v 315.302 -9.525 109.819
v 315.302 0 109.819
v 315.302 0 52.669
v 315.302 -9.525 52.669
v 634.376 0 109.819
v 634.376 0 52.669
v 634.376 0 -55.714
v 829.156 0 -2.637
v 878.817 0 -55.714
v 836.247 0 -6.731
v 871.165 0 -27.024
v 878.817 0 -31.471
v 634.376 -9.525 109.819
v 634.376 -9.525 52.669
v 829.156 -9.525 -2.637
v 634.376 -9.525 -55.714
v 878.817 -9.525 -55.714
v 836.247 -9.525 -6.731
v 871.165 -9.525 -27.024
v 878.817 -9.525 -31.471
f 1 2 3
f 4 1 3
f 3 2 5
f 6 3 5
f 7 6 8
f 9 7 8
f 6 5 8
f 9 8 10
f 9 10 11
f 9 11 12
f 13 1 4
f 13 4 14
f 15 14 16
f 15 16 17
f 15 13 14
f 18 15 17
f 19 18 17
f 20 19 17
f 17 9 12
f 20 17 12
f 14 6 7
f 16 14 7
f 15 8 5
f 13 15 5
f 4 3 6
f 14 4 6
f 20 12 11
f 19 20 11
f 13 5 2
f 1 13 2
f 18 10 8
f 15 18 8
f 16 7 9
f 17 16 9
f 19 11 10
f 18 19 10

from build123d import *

# Parameters (mm, degrees)
F0_W     = 304.8
F0_H     = 25.4
F1_DEPTH = 9.525


with BuildPart() as f1:
    # F0 (on Front) → F1 (new body)
    with BuildSketch(Plane.XZ):
        with Locations((474.0515406549, 97.119426218)):
            Rectangle(F0_W, F0_H)
        Polygon((315.3015375137, 52.669426218), (321.6515406549, 52.669426218), (321.6515406549, 84.419426218), (321.6515406549, 109.819426218), (315.3015375137, 109.819426218), align=None)
        Polygon((365.3527498245, 52.669426218), (626.4515406549, 52.669426218), (626.4515406549, 84.419426218), (321.6515406549, 84.419426218), (321.6515406549, 52.669426218), align=None)
        Polygon((626.4515406549, 84.419426218), (626.4515406549, 52.669426218), (634.3763406549, 66.3955824579), (634.3763406549, 109.819426218), (626.4515406549, 109.819426218), align=None)
        Polygon((634.3763406549, 109.819426218), (634.3763406549, 66.3955824579), (642.3265406549, 80.1657327882), (653.179416568, 98.963465278), align=None)
        Polygon((653.179416568, 98.963465278), (642.3265406549, 80.1657327882), (689.9515406549, 52.669426218), (733.3630443075, 52.669426218), align=None)
        Polygon((642.3265406549, 80.1657327882), (634.3763406549, 66.3955824579), (634.3763406549, 52.669426218), (689.9515406549, 52.669426218), align=None)
        Polygon((634.3763406549, 66.3955824579), (626.4515406549, 52.669426218), (634.3763406549, 52.669426218), align=None)
        Polygon((802.4279027039, -48.930573782), (634.3763406549, 48.0940408048), (634.3763406549, -55.7142719626), (807.9667468622, -55.7142719626), (836.2473392138, -6.7308491415), (829.155778617, -2.636534722), (818.3029027039, -21.4342672118), align=None)
        Polygon((634.3763406549, 52.669426218), (634.3763406549, 48.0940408048), (802.4279027039, -48.930573782), (818.3029027039, -21.4342672118), (689.9515406549, 52.669426218), align=None)
        Polygon((733.3630443075, 52.669426218), (689.9515406549, 52.669426218), (818.3029027039, -21.4342672118), (829.155778617, -2.636534722), align=None)
        Polygon((836.2473392138, -6.7308491415), (807.9667468622, -55.7142719626), (824.2119550705, -55.7142719626), (854.6004848789, -55.7142719626), (871.1648442681, -27.0239599059), (848.3022022869, -13.73680994), align=None)
        Polygon((871.1648442681, -27.0239599059), (854.6004848789, -55.7142719626), (878.8170780003, -55.7142719626), (878.8170780003, -31.4712314529), align=None)
    extrude(amount=F1_DEPTH)


solid = f1.part
